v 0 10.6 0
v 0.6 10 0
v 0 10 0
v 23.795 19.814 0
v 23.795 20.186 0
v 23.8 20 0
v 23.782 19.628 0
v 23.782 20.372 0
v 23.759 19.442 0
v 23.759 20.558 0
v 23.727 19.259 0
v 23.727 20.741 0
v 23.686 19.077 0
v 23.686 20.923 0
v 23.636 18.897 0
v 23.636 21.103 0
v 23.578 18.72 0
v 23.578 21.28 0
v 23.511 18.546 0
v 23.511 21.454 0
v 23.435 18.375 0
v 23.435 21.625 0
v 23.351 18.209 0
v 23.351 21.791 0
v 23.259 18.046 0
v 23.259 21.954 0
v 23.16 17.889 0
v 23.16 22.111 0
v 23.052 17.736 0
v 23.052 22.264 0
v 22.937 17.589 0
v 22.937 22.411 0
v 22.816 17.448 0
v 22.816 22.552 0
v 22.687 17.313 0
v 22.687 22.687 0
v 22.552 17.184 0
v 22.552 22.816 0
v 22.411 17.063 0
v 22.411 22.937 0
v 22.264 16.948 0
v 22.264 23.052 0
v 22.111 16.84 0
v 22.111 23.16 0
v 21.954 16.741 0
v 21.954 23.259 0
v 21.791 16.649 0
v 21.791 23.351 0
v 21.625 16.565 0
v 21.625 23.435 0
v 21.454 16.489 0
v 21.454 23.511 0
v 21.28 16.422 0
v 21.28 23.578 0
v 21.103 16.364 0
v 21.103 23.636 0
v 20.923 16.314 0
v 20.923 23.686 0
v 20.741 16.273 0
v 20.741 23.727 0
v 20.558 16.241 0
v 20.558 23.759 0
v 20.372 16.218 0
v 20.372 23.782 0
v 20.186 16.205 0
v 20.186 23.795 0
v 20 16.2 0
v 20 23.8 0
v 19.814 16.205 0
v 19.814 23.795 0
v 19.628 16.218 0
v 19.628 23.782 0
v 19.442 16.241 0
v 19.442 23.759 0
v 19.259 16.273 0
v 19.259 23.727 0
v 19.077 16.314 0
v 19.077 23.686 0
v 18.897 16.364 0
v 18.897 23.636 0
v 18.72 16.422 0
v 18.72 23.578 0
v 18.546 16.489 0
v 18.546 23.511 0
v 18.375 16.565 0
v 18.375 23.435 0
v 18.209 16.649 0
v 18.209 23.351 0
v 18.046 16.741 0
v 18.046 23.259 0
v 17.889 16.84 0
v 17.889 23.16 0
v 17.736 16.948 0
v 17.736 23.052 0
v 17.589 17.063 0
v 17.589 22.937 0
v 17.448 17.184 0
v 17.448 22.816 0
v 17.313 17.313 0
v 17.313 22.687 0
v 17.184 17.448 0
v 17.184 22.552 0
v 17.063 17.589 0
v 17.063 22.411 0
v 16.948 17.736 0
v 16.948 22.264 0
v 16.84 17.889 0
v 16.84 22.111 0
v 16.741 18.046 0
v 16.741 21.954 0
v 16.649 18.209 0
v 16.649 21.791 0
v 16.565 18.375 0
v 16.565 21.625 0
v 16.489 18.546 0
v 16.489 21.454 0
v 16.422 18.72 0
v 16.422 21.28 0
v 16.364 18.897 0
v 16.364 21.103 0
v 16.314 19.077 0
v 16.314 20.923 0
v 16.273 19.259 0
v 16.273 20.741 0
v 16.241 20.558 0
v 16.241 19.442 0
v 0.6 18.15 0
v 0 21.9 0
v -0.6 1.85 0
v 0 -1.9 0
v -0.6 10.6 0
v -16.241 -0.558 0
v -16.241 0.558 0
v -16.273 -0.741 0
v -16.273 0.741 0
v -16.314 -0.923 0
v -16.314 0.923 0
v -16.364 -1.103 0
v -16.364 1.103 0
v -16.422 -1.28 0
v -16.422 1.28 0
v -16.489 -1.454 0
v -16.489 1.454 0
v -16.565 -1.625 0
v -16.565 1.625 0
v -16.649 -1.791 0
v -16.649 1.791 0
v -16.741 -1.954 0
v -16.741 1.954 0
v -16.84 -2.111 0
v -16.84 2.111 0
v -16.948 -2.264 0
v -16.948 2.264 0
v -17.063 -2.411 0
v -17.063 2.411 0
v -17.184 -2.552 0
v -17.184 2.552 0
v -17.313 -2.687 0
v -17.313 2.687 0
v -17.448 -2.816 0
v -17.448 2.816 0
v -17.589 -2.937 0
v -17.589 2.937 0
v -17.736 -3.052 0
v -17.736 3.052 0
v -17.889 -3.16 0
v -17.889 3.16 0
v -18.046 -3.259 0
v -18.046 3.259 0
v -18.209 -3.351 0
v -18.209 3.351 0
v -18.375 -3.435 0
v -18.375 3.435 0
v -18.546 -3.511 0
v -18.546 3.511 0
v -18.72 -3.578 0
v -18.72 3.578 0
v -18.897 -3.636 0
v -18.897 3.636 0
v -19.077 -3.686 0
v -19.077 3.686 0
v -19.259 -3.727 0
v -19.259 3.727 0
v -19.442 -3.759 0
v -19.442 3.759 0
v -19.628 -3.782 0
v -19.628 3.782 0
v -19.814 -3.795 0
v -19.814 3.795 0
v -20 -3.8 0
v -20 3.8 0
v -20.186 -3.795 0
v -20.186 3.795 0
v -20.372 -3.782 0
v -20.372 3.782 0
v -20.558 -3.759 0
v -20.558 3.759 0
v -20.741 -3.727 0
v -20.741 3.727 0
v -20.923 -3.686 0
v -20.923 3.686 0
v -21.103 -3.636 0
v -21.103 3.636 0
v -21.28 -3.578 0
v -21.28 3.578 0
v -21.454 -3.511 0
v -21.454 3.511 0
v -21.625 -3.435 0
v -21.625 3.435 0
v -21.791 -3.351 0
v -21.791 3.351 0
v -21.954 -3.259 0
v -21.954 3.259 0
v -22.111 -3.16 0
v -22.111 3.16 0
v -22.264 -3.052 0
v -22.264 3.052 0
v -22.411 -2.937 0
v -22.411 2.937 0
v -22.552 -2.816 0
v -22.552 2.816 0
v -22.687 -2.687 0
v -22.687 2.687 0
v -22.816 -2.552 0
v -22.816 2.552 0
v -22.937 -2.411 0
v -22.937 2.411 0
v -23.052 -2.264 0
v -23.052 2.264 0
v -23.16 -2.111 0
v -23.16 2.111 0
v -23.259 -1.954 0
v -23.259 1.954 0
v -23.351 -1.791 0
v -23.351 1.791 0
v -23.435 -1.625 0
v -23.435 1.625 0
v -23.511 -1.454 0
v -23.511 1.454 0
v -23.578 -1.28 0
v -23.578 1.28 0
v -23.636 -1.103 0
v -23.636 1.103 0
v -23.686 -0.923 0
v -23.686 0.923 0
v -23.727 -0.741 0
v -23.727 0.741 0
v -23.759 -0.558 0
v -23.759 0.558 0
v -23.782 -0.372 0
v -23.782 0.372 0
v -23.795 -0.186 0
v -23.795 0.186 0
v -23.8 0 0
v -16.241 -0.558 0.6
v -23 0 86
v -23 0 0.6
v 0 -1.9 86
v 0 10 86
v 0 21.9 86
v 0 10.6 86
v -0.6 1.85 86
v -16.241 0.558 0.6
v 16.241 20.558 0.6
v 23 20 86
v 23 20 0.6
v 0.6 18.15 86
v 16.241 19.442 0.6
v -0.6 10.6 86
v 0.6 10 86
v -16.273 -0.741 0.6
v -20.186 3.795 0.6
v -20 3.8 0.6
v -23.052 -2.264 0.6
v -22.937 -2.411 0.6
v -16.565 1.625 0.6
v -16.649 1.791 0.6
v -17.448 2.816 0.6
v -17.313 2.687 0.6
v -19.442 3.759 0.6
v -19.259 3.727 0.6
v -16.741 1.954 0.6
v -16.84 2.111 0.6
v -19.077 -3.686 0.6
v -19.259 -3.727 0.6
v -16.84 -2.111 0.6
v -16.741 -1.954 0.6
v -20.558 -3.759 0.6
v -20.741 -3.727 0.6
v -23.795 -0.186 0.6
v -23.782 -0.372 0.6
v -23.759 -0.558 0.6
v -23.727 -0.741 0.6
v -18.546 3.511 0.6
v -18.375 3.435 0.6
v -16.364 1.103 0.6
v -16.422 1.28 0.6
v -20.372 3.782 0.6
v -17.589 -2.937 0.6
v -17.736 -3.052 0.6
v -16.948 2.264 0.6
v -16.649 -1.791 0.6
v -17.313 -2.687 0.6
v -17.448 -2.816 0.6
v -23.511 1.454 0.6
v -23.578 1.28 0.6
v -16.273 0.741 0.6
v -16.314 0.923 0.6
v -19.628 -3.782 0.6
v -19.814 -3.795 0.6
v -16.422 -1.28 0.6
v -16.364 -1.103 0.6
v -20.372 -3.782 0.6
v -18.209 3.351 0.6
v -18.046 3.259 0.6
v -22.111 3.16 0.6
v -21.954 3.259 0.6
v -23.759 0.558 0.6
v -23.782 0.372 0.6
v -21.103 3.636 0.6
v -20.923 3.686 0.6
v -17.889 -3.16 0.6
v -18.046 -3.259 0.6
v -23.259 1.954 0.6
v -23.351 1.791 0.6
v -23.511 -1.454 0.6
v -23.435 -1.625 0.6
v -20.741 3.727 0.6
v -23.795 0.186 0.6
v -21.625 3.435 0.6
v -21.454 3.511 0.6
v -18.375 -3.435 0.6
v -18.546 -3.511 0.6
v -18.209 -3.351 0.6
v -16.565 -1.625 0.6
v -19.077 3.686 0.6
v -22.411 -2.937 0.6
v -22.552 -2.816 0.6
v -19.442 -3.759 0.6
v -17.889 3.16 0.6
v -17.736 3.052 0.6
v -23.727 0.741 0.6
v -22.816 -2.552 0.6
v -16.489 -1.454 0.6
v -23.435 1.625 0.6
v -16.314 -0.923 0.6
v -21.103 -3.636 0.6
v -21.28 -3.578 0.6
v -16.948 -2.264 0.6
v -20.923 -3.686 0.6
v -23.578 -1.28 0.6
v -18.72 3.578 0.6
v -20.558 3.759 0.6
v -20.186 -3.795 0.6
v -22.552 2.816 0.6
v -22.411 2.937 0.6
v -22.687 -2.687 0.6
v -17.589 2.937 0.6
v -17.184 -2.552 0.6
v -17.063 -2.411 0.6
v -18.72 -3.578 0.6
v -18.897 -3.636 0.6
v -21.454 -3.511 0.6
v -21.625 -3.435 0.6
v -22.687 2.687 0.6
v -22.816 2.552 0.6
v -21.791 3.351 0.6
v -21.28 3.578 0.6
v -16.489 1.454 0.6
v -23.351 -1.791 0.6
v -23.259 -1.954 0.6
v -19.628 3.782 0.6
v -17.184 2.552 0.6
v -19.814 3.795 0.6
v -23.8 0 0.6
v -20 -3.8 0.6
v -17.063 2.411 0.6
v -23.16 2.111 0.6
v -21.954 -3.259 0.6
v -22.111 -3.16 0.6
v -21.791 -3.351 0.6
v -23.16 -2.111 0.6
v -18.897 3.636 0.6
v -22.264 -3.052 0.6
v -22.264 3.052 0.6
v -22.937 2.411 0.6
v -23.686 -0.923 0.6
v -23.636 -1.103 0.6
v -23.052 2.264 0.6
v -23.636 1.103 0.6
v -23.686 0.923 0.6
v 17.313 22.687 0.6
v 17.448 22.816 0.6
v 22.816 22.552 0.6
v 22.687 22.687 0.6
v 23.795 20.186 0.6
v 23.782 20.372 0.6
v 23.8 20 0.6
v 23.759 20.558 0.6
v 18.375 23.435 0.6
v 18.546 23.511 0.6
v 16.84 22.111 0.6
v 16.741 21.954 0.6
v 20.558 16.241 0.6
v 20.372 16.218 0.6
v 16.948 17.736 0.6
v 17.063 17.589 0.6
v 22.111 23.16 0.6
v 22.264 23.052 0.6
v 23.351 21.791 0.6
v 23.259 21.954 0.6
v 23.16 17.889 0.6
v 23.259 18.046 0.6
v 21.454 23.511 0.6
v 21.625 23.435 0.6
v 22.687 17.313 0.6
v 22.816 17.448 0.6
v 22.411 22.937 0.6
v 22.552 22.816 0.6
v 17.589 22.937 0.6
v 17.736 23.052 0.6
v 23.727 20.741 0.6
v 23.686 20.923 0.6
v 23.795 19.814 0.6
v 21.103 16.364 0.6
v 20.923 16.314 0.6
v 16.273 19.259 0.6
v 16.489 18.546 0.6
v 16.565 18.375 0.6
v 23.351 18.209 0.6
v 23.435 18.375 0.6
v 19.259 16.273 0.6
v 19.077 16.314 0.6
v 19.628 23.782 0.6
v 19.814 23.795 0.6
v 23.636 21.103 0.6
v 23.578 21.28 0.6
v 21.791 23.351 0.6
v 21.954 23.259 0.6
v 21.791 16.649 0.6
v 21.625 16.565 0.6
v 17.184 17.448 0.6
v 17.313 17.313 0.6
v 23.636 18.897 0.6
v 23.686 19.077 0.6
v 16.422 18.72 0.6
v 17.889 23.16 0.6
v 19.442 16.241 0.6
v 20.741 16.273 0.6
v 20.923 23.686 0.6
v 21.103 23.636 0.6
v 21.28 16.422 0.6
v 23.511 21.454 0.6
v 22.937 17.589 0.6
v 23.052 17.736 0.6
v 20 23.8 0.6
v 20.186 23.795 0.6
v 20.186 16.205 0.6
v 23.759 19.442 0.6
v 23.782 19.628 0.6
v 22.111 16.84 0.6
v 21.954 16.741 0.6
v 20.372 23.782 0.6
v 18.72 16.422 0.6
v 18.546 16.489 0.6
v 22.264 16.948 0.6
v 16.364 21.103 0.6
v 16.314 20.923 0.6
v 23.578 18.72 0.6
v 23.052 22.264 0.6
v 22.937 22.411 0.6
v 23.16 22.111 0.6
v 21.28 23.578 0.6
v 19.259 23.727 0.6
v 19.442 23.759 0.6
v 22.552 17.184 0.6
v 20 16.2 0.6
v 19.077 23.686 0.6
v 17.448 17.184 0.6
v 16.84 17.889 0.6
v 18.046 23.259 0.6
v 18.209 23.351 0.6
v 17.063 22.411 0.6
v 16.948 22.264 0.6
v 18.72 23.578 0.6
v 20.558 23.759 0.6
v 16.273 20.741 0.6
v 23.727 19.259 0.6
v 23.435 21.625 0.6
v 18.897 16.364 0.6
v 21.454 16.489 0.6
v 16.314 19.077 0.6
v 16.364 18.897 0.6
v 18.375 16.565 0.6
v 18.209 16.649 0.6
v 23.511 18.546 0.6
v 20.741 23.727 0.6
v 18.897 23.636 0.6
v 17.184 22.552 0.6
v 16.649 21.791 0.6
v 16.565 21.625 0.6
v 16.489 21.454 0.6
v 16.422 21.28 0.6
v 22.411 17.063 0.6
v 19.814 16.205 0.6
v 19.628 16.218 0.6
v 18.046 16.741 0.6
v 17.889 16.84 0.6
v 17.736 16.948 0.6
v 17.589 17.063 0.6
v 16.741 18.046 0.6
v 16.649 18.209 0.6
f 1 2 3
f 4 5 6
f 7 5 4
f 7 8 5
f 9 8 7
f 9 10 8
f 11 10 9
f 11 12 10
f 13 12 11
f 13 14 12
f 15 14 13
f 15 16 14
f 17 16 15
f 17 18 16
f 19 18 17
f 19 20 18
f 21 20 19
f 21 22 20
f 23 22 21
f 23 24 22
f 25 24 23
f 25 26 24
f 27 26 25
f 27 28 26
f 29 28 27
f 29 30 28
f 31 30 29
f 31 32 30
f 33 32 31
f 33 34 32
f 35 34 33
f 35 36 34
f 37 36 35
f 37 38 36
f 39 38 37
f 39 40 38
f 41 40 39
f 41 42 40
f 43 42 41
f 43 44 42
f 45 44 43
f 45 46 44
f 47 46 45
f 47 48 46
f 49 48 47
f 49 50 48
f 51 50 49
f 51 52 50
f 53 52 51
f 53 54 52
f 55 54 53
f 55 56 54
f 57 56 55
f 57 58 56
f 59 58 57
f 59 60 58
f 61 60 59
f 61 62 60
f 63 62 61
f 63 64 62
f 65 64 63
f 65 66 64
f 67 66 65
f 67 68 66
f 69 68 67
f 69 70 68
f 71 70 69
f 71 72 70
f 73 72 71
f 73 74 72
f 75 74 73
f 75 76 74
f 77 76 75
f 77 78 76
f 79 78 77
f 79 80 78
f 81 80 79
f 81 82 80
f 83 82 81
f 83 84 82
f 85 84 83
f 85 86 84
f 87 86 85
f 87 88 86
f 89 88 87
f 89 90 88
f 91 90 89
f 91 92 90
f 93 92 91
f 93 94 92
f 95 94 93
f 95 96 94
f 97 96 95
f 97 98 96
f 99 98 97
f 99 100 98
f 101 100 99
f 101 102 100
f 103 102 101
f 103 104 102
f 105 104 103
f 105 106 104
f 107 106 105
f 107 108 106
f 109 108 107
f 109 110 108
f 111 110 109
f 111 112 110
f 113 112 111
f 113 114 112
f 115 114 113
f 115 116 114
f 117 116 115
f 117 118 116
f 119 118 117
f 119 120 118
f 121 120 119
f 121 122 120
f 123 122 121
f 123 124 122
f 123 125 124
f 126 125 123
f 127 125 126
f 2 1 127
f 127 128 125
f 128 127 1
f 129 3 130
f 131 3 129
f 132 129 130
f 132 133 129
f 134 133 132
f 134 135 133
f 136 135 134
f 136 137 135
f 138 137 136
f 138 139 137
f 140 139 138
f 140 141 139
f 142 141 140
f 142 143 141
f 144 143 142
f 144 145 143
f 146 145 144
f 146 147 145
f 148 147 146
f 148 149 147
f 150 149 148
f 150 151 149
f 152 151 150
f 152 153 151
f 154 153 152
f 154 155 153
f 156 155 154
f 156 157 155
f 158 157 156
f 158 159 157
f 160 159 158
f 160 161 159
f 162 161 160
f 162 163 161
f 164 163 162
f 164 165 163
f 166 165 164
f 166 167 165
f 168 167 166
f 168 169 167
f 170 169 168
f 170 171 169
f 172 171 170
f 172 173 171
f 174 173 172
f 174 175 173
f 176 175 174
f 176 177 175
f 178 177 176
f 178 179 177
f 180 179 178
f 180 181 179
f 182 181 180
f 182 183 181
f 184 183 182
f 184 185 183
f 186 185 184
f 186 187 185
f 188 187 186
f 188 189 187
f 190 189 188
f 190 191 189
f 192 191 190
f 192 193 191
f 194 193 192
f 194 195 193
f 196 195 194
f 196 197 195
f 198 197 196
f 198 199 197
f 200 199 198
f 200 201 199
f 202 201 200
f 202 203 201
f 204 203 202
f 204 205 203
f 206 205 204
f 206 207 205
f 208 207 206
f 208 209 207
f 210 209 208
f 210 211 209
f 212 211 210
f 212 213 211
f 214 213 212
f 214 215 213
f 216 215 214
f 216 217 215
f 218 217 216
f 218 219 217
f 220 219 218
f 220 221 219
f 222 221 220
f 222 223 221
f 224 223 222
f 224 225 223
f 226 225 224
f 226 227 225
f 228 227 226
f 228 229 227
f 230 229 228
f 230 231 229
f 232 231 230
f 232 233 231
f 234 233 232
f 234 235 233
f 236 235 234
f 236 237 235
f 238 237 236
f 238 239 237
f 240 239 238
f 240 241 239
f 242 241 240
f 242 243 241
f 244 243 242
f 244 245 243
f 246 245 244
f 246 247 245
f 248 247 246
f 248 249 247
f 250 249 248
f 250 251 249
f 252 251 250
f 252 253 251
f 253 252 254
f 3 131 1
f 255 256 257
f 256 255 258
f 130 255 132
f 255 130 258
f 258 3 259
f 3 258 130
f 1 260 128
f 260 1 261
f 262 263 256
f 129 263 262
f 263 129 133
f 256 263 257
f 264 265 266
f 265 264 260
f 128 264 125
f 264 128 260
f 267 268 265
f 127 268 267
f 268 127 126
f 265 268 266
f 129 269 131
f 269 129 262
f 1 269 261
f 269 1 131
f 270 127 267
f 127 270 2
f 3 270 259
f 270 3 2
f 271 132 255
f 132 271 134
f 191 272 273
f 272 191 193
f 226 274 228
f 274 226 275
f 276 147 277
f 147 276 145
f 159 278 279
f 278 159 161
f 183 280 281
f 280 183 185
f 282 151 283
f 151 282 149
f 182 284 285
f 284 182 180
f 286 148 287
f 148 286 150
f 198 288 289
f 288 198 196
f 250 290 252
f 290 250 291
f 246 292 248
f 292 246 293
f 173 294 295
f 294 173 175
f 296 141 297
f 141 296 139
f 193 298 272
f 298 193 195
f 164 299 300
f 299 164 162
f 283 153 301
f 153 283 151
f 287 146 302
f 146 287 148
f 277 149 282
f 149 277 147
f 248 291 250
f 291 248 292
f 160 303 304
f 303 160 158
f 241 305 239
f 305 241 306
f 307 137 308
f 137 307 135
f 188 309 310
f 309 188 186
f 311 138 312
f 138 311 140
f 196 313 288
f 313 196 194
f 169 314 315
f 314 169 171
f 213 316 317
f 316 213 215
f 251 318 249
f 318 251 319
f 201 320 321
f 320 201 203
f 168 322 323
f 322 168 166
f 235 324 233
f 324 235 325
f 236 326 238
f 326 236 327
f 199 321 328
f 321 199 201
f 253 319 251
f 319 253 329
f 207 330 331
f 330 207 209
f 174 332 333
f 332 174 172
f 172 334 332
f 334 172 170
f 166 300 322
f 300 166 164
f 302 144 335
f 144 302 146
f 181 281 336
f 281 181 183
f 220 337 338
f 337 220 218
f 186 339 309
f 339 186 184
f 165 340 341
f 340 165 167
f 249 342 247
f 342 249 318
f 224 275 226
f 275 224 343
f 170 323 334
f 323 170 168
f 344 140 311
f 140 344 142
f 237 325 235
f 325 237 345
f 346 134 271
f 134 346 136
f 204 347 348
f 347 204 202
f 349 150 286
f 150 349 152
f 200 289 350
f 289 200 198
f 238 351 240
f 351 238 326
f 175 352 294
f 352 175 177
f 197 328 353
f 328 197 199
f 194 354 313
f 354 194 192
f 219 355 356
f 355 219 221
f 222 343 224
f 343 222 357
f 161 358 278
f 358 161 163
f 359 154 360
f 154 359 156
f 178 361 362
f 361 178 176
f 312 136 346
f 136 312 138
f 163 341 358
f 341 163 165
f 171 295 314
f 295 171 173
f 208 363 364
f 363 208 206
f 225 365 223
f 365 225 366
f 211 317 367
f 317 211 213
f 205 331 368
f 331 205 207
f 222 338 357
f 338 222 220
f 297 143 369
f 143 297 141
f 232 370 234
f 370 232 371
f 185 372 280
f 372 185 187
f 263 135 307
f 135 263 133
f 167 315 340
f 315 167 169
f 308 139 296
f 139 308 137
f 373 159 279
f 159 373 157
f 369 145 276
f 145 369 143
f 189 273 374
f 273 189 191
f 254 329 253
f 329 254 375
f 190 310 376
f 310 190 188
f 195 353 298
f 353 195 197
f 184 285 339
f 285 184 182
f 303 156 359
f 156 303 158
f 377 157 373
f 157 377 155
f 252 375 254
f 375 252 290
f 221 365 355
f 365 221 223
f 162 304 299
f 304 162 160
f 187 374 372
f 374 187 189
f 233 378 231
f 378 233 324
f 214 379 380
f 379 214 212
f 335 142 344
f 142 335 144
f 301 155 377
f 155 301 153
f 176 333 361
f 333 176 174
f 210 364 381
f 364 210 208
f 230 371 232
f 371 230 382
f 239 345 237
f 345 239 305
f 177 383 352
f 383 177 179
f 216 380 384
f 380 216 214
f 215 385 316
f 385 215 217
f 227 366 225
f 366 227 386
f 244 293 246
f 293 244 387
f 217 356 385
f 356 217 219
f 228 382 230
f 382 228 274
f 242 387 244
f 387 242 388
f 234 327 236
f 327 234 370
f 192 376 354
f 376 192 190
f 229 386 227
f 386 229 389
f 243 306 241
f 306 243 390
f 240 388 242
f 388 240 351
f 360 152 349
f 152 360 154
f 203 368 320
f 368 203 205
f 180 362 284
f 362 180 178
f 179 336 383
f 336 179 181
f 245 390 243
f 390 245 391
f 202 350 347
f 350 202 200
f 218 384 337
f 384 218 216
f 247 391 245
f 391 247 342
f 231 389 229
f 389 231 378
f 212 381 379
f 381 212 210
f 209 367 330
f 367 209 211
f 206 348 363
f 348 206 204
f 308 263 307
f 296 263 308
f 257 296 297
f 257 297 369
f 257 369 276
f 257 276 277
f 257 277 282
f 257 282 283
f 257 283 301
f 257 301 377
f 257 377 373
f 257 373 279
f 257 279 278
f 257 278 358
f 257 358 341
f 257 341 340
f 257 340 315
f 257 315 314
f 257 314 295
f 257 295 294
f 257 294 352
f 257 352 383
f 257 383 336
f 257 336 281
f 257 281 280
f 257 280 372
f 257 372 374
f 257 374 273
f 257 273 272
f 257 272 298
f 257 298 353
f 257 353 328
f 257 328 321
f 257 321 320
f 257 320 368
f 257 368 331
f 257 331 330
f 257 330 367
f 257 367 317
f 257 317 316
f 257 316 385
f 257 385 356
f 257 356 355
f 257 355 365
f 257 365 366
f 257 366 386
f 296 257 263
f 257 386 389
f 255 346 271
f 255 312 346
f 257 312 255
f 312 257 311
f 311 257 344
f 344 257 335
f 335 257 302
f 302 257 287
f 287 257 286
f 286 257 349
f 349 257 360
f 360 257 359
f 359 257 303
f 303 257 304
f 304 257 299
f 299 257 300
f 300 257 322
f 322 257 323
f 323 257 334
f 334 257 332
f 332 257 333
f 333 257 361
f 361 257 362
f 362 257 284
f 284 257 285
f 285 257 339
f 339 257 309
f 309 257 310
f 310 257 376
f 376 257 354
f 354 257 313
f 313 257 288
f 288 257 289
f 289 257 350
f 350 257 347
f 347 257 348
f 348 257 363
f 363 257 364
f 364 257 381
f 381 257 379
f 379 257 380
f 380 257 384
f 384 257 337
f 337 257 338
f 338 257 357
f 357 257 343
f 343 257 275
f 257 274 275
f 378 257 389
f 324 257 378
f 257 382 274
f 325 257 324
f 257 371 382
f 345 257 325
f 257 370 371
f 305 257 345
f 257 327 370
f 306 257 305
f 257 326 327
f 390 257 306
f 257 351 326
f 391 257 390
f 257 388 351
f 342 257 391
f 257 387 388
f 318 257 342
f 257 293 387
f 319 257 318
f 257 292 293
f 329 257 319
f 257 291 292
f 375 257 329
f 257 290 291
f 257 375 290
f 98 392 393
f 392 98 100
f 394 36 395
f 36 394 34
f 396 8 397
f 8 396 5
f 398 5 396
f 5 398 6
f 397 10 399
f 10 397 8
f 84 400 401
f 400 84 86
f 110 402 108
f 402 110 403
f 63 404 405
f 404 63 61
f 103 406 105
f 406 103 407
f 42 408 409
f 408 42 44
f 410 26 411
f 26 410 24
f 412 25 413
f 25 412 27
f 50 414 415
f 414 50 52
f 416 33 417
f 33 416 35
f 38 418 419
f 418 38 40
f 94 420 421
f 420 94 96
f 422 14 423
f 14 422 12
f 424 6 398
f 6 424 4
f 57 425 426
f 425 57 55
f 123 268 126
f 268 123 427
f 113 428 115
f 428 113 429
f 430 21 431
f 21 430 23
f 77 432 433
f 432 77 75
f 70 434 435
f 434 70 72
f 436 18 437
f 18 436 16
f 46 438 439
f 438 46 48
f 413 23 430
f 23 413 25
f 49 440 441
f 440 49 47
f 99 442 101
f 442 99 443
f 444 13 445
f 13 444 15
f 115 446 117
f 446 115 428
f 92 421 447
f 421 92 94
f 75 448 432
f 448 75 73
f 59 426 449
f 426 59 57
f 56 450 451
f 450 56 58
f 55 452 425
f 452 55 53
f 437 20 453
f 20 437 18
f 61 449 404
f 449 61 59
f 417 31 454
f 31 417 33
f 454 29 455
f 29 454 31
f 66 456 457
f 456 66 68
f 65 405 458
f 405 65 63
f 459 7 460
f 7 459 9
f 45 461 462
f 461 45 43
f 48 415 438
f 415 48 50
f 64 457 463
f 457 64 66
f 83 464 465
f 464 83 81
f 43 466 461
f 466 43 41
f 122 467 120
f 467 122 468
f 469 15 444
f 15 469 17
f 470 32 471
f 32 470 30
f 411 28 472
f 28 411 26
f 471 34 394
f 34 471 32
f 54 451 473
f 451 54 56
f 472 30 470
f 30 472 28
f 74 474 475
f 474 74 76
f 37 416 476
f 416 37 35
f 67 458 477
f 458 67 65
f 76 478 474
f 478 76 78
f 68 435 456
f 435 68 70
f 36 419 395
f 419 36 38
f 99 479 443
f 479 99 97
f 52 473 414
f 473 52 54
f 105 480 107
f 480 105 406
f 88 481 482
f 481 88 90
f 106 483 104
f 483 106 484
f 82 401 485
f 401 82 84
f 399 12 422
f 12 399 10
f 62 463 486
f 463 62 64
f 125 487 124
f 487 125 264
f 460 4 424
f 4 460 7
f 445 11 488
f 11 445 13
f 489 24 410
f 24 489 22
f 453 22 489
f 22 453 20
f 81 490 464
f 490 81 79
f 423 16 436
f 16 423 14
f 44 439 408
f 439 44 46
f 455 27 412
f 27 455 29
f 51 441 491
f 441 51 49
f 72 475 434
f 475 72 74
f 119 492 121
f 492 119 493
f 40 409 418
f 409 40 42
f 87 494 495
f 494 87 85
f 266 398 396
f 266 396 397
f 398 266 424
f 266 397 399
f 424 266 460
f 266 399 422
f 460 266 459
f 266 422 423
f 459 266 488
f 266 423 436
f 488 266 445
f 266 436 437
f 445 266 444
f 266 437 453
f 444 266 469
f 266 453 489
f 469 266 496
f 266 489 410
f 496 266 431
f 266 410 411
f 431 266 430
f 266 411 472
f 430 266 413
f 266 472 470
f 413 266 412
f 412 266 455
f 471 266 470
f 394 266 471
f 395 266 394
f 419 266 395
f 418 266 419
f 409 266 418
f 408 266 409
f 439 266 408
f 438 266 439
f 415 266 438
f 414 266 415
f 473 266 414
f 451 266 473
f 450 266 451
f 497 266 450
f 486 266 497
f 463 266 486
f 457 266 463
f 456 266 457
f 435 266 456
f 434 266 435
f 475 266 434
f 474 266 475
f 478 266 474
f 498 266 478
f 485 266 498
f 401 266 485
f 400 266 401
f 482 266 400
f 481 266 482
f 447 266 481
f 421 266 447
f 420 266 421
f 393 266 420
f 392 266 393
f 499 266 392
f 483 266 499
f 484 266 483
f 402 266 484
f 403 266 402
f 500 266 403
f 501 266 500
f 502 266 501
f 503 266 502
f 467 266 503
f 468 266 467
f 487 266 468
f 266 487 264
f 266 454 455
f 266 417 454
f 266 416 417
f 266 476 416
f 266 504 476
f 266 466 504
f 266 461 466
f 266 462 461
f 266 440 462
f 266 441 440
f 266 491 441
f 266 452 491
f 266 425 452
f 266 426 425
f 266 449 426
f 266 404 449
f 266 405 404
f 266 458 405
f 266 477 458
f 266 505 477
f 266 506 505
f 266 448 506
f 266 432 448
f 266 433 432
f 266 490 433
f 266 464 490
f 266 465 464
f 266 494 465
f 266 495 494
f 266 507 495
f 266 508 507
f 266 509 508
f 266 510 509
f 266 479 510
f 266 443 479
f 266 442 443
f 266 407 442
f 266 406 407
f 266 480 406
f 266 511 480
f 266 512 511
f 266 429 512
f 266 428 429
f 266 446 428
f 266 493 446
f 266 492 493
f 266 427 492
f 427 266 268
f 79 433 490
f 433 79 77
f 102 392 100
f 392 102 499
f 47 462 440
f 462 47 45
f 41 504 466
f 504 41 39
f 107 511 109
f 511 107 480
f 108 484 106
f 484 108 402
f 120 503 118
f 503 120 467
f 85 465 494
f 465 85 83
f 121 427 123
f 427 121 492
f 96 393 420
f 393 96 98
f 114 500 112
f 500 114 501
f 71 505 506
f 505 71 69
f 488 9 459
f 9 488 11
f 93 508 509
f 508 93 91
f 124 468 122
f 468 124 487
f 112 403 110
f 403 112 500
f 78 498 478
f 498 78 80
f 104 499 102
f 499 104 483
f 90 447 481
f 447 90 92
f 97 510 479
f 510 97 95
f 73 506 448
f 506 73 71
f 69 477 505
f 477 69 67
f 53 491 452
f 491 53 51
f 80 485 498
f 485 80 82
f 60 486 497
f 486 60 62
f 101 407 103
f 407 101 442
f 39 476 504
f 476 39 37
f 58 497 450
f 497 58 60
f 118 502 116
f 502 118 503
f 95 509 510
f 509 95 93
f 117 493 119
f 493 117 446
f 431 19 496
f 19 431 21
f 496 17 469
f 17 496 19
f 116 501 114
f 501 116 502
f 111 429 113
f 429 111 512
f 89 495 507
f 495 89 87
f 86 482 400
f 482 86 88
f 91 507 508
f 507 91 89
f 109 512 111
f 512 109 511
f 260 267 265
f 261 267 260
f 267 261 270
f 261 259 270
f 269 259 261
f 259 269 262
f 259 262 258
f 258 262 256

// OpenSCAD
TEExt = 3;
width = 20+TEExt;
thick = 3.8;
tipLen = 26;
eleLen = 172;
cutAng = 90-55;

TELen = eleLen-width*tan(cutAng);

offsetY  = 20;

$fn = 128;

//EleExtX2();

Cut(){EleExtX2();}

//module EleExtX2()
//{
//translate([width,0,0])
//   EleExt();
//translate([-width,offsetY,0])
//rotate([0,0,180])
//   EleExt();
//cube([0.6,offsetY,TELen]);
//}

module EleExtX2()
{
translate([0,0,0])
   EleExt();
translate([0,offsetY,0])
rotate([0,0,180])
   EleExt();
translate([-0.6,0,0])
   cube([0.6,offsetY/2+0.6,eleLen]);
translate([0,offsetY/2,0])
   cube([0.6,offsetY/2,eleLen]);
}

//TipExt();

top = false;

//EleExtCut();

module Cut()
{
intersection()
   {
   if(top)
      translate([-eleLen/2,-eleLen/2,eleLen/2]) cube([eleLen, eleLen, eleLen/2]);
   else
      translate([-eleLen/2,-eleLen/2,0]) cube([eleLen, eleLen, eleLen/2]);
   union()
      {
      children();
      translate([-width+TEExt, 0,top?eleLen/2:0])
         cylinder(h=0.6,r=thick);

      translate([0,offsetY,0])
      translate([width-TEExt, 0,top?eleLen/2:0])
         cylinder(h=0.6,r=thick);
      }
   }
}

module EleExtCut()
{
rotate([0,0,-90])  
intersection()
   {
   if(top)
      translate([-eleLen/2,-eleLen/2,eleLen/2]) cube([eleLen, eleLen, eleLen/2]);
   else
      translate([-eleLen/2,-eleLen/2,0]) cube([eleLen, eleLen, eleLen/2]);
   union()
      {
      EleExt();
      translate([-width+TEExt, 0,top?eleLen/2:0])
         cylinder(h=0.6,r=thick);
      }
   }
}

module TipExt()
{
rotate([0,0,-90])
   {
   Extension(tipLen);
   translate([TEExt, 0,0])
      cylinder(h=0.6,r=thick);
   }
}

module Extension(tipLen)
{
linear_extrude(height = tipLen)
   polygon([[0,0],[width, thick/2], [width, -thick/2]]);

}

module EleExt()
{
difference()
   {
   translate([-width,0,0])
      Extension(eleLen);
   translate([-width,-2*thick,TELen])
      rotate([0,-cutAng,0])
      cube([2*width, eleLen, eleLen]);
   }

}
